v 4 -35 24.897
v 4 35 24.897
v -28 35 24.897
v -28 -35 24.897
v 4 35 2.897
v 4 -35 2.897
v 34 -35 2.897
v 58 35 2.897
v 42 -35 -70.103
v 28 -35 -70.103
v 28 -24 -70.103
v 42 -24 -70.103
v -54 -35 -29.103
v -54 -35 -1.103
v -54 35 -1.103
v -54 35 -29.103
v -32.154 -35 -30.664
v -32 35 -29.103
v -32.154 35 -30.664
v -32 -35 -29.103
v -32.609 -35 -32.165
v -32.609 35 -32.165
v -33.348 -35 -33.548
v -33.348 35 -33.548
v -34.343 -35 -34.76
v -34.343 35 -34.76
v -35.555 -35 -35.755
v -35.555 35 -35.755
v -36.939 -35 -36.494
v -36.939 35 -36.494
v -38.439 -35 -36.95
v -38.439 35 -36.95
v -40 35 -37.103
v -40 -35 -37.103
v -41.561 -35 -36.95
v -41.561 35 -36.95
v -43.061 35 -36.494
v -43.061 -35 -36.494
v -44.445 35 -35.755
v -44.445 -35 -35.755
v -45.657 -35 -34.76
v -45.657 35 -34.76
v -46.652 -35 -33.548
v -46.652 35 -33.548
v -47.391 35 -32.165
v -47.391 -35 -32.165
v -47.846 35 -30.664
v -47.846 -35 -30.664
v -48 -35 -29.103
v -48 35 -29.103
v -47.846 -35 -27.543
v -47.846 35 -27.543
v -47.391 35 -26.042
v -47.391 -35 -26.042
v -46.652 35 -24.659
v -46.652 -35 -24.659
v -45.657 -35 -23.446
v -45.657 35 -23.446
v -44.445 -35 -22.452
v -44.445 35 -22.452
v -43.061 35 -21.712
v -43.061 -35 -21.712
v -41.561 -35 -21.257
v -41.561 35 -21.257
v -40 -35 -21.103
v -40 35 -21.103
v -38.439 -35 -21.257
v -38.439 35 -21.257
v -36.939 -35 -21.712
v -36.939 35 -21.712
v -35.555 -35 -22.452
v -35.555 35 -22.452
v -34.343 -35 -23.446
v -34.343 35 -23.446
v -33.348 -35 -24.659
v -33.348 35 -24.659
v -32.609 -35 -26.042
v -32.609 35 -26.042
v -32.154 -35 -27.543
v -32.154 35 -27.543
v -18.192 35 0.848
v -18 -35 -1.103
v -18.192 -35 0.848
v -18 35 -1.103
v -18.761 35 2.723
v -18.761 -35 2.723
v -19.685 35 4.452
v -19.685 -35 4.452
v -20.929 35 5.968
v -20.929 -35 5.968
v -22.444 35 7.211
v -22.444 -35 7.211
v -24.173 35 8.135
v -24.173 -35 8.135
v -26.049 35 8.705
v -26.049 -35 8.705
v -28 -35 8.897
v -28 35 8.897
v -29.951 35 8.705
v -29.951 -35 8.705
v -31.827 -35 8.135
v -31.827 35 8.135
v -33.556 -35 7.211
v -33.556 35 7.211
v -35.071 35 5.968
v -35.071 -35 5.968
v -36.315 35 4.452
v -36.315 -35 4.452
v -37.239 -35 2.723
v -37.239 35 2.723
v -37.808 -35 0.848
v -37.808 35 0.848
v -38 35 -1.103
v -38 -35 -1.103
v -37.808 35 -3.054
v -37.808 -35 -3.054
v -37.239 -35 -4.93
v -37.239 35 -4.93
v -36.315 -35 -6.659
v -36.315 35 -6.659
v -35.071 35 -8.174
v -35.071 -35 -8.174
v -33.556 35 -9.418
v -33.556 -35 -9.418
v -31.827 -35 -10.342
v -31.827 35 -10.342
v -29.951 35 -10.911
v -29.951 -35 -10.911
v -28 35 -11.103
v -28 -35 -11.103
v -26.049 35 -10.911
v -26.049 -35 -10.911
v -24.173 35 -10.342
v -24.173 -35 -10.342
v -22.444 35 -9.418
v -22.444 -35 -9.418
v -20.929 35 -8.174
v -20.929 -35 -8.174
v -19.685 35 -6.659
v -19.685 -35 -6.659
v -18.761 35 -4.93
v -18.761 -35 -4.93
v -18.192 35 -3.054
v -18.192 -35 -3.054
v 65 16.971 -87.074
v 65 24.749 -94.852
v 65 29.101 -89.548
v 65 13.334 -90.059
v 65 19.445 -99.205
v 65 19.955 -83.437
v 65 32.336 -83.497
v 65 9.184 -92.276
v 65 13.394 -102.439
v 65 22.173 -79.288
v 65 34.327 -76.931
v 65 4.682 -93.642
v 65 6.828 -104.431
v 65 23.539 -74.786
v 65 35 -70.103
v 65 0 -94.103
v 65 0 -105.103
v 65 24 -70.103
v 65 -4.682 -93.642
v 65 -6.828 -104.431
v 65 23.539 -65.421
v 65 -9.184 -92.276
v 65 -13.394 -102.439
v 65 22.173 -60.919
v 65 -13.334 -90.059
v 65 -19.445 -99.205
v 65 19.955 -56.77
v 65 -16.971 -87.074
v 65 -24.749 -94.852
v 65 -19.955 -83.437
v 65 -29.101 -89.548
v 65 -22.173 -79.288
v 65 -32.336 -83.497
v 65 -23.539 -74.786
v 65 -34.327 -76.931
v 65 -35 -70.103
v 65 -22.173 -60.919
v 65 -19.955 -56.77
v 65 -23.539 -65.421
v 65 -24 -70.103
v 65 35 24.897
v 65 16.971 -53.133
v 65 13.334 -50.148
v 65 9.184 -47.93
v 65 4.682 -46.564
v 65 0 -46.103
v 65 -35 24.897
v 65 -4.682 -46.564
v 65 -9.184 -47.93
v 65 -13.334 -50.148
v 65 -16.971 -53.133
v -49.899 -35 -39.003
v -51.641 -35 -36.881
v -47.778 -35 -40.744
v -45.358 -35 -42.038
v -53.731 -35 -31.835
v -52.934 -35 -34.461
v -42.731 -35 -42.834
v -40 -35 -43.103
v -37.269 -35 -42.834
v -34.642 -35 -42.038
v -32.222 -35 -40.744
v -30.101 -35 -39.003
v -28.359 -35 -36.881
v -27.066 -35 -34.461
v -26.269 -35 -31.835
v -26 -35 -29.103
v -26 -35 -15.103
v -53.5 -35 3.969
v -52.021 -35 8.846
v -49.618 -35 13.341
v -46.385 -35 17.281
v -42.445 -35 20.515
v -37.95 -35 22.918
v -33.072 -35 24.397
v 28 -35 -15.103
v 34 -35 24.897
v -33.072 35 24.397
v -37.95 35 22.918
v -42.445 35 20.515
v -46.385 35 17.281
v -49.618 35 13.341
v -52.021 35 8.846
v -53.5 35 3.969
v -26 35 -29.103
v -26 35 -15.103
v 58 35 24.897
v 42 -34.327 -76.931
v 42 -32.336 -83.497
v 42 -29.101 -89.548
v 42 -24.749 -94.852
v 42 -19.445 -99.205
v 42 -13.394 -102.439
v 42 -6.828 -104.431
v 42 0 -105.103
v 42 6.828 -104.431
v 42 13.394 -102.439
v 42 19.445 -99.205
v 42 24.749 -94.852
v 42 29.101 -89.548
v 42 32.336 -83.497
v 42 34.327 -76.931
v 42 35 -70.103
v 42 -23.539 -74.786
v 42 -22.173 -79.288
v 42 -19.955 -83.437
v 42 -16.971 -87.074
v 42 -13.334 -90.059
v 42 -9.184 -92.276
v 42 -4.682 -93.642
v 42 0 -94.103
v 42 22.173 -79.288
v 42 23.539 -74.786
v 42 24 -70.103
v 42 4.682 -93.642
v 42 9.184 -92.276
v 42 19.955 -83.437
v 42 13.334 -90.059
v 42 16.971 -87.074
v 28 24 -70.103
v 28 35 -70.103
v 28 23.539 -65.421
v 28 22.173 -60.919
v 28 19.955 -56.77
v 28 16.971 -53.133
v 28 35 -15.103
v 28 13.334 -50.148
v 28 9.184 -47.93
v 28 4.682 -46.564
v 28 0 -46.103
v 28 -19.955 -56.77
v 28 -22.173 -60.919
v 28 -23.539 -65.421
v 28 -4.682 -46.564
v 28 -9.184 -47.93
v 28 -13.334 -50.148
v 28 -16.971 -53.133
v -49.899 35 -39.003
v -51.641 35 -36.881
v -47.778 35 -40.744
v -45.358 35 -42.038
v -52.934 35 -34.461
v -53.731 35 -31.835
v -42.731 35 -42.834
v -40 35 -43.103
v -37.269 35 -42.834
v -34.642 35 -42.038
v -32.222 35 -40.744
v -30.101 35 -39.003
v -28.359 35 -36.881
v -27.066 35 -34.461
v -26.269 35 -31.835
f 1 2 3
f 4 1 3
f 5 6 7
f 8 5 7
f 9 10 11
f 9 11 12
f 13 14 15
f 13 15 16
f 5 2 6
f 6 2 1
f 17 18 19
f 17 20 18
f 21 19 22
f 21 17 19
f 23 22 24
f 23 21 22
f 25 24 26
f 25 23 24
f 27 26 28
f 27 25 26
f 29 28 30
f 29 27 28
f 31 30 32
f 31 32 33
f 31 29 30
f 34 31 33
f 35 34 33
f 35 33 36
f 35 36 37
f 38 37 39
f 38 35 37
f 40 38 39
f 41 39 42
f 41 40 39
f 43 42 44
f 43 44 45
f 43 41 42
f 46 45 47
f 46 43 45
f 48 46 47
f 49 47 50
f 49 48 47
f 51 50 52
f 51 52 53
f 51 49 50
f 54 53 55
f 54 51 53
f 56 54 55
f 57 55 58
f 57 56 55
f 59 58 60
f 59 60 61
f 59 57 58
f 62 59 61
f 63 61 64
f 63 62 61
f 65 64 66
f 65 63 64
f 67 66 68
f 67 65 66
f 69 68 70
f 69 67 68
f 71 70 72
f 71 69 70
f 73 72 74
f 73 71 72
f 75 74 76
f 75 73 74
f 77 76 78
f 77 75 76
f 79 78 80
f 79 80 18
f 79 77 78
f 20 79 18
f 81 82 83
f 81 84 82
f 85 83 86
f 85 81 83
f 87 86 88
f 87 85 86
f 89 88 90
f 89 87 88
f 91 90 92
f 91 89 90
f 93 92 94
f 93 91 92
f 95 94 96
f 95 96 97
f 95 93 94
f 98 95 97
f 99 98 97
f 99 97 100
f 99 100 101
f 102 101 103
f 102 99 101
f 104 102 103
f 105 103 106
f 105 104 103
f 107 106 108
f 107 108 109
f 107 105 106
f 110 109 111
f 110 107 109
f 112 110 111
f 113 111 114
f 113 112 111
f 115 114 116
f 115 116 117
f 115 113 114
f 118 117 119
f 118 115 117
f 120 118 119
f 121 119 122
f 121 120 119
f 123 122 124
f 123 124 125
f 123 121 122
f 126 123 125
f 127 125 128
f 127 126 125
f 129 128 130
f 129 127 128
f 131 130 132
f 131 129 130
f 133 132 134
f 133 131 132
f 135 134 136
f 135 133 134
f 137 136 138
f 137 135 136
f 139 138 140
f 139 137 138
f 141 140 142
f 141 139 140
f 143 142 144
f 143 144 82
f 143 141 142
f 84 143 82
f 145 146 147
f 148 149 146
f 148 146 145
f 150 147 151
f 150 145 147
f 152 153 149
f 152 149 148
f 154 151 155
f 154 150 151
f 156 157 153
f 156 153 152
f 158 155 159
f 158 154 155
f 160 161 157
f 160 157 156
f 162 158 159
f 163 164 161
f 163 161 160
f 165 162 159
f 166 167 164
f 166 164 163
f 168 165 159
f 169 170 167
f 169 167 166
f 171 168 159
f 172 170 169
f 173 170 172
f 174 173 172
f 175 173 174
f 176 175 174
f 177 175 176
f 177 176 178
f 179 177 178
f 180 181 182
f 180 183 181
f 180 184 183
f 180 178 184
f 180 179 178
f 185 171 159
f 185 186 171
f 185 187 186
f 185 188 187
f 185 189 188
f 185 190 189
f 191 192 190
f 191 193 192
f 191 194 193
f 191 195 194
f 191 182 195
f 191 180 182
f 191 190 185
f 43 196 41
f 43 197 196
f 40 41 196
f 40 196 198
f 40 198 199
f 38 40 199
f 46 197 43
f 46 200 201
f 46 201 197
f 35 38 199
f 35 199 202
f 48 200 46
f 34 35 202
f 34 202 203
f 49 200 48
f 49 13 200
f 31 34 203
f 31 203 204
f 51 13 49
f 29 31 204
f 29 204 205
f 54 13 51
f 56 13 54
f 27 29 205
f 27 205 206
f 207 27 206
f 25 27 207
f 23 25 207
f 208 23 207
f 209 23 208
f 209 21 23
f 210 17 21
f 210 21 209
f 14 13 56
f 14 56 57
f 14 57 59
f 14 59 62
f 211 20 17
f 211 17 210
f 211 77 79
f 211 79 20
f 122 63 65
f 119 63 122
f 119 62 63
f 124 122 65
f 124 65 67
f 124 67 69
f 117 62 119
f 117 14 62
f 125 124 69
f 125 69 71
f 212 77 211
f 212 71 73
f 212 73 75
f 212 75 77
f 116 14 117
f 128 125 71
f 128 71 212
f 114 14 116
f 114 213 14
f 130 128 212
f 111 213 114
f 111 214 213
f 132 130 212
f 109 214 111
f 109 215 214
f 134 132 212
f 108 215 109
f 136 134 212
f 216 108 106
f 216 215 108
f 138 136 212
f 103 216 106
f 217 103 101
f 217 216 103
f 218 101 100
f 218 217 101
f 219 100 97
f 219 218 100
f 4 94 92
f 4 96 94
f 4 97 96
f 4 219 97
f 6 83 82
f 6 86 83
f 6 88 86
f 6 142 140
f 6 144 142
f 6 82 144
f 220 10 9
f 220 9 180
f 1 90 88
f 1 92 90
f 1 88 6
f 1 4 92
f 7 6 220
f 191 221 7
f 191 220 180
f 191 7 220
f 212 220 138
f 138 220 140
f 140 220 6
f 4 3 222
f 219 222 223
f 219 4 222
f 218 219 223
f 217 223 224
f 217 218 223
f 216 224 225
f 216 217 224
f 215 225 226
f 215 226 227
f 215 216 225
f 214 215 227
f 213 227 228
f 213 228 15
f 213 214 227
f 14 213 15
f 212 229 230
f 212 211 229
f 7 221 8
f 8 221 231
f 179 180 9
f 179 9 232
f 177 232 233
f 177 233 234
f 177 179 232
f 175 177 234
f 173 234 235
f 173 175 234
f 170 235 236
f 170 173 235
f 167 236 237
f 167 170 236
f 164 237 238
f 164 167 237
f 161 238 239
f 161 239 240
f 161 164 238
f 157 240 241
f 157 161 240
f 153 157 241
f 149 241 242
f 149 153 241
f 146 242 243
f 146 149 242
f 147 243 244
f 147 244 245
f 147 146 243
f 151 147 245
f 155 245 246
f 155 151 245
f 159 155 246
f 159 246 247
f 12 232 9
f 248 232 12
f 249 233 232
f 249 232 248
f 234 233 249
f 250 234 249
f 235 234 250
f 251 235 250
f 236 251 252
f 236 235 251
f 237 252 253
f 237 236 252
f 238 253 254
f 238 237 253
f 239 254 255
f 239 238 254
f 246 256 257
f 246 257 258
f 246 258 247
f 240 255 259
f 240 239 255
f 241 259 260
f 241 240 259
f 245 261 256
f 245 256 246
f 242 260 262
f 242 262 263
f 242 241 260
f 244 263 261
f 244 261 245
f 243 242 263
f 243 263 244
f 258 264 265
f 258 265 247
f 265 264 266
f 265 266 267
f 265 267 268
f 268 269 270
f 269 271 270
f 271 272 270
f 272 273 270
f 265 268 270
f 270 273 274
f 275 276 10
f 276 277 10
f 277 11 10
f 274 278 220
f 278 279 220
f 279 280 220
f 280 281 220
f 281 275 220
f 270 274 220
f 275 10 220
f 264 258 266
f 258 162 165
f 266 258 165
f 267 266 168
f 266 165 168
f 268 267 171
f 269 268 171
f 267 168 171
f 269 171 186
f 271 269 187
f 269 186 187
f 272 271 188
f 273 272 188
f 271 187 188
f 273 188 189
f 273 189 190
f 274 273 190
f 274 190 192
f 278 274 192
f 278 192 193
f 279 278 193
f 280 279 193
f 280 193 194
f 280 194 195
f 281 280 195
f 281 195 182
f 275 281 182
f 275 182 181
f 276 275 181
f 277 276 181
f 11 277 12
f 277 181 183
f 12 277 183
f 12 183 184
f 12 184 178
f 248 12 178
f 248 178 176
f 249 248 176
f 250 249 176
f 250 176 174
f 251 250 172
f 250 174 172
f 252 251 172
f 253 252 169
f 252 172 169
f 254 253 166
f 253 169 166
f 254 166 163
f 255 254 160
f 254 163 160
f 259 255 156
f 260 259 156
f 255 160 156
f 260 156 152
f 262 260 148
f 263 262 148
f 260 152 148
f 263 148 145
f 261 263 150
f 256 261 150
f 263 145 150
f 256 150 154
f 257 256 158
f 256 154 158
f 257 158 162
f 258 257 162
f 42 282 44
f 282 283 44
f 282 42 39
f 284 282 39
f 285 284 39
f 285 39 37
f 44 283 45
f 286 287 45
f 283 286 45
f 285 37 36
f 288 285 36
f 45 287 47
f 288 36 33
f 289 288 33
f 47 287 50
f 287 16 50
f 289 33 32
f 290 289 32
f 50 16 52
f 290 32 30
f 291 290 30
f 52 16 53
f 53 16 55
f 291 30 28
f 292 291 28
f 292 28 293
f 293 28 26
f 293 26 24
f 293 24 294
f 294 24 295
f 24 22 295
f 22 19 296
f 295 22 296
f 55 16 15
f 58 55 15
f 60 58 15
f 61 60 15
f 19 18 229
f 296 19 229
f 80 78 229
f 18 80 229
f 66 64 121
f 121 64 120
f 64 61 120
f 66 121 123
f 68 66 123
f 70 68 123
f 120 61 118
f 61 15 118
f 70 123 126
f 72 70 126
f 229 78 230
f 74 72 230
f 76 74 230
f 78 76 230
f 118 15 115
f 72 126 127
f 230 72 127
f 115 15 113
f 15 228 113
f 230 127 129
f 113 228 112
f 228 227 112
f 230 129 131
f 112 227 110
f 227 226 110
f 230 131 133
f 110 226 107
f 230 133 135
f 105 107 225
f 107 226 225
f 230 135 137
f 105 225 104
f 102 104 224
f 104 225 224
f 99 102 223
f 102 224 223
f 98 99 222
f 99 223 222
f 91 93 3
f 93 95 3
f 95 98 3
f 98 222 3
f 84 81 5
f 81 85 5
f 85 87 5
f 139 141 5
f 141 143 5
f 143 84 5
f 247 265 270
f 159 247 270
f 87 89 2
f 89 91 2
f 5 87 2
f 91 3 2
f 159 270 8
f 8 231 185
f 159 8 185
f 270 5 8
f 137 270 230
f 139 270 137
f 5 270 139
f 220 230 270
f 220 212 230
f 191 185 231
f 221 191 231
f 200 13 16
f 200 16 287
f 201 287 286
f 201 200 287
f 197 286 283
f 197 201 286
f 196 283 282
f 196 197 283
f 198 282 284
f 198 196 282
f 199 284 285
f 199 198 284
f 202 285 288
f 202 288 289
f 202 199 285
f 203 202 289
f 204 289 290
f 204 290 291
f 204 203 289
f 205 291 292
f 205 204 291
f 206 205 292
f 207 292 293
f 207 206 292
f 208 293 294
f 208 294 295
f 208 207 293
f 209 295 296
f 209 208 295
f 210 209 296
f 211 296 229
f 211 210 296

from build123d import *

# Parameters (mm, degrees)
F0_W     = 37
F0_H     = 55
F0_R     = 10
F1_DEPTH = 35
F3_DEPTH = 22
F4_W     = 23
F4_H     = 35
F6_R     = 24
F7_DEPTH = 37


with BuildPart() as f1:
    # F0 (on Front) → F1 (new body, symmetric)
    with BuildSketch(Plane.XZ):
        with Locations((46.500005, -42.603335)):
            Rectangle(F0_W, F0_H)
        with BuildLine():
            Line((28.000005, -15.103335), (65.000005, -15.103335))
            Line((65.000005, -15.103335), (65.000005, 24.896665))
            Line((65.000005, 24.896665), (-27.999995, 24.896665))
            ThreePointArc((-27.999995, 24.896665), (-46.384771, 17.281441), (-53.999995, -1.103335))
            Line((-53.999995, -1.103335), (-53.999995, -15.103335))
            Line((-53.999995, -15.103335), (-25.999995, -15.103335))
            Line((-25.999995, -15.103335), (28.000005, -15.103335))
        make_face()
        with Locations((-27.999995, -1.103335)):
            Circle(F0_R, mode=Mode.SUBTRACT)
        with BuildLine():
            Line((-25.999995, -29.103335), (-25.999995, -15.103335))
            Line((-25.999995, -15.103335), (-53.999995, -15.103335))
            Line((-53.999995, -15.103335), (-53.999995, -29.103335))
            Line((-53.999995, -29.103335), (-47.999995, -29.103335))
            ThreePointArc((-47.999995, -29.103335), (-39.999995, -21.103335), (-31.999995, -29.103335))
            Line((-31.999995, -29.103335), (-25.999995, -29.103335))
        make_face()
        with BuildLine():
            ThreePointArc((-53.999995, -29.103335), (-39.999995, -43.103335), (-25.999995, -29.103335))
            Line((-25.999995, -29.103335), (-31.999995, -29.103335))
            ThreePointArc((-31.999995, -29.103335), (-39.999995, -37.103335), (-47.999995, -29.103335))
            Line((-47.999995, -29.103335), (-53.999995, -29.103335))
        make_face()
    extrude(amount=F1_DEPTH, both=True)

    # F2 (on face) → F3 (cut)
    with BuildSketch(Plane.XY.offset(24.896665)):
        Polygon((58.000005, 35), (4.000005, 35), (4.000005, -35), (34.000005, -35), align=None)
    extrude(amount=-F3_DEPTH, mode=Mode.SUBTRACT)

    # F4 (on face) → F5 (revolve)
    with BuildSketch(Plane(origin=(0, 0, -70.103335), x_dir=(1, 0, 0), z_dir=(0, 0, -1))):
        with Locations((53.500005, 17.5)):
            Rectangle(F4_W, F4_H)
    revolve(axis=Axis((53.500005, 0, -70.103335), (1, 0, 0)))

    # F6 (on face) → F7 (cut)
    with BuildSketch(Plane.YZ.offset(65.000005)):
        with Locations((0, -70.103335)):
            Circle(F6_R)
    extrude(amount=-F7_DEPTH, mode=Mode.SUBTRACT)


solid = f1.part
